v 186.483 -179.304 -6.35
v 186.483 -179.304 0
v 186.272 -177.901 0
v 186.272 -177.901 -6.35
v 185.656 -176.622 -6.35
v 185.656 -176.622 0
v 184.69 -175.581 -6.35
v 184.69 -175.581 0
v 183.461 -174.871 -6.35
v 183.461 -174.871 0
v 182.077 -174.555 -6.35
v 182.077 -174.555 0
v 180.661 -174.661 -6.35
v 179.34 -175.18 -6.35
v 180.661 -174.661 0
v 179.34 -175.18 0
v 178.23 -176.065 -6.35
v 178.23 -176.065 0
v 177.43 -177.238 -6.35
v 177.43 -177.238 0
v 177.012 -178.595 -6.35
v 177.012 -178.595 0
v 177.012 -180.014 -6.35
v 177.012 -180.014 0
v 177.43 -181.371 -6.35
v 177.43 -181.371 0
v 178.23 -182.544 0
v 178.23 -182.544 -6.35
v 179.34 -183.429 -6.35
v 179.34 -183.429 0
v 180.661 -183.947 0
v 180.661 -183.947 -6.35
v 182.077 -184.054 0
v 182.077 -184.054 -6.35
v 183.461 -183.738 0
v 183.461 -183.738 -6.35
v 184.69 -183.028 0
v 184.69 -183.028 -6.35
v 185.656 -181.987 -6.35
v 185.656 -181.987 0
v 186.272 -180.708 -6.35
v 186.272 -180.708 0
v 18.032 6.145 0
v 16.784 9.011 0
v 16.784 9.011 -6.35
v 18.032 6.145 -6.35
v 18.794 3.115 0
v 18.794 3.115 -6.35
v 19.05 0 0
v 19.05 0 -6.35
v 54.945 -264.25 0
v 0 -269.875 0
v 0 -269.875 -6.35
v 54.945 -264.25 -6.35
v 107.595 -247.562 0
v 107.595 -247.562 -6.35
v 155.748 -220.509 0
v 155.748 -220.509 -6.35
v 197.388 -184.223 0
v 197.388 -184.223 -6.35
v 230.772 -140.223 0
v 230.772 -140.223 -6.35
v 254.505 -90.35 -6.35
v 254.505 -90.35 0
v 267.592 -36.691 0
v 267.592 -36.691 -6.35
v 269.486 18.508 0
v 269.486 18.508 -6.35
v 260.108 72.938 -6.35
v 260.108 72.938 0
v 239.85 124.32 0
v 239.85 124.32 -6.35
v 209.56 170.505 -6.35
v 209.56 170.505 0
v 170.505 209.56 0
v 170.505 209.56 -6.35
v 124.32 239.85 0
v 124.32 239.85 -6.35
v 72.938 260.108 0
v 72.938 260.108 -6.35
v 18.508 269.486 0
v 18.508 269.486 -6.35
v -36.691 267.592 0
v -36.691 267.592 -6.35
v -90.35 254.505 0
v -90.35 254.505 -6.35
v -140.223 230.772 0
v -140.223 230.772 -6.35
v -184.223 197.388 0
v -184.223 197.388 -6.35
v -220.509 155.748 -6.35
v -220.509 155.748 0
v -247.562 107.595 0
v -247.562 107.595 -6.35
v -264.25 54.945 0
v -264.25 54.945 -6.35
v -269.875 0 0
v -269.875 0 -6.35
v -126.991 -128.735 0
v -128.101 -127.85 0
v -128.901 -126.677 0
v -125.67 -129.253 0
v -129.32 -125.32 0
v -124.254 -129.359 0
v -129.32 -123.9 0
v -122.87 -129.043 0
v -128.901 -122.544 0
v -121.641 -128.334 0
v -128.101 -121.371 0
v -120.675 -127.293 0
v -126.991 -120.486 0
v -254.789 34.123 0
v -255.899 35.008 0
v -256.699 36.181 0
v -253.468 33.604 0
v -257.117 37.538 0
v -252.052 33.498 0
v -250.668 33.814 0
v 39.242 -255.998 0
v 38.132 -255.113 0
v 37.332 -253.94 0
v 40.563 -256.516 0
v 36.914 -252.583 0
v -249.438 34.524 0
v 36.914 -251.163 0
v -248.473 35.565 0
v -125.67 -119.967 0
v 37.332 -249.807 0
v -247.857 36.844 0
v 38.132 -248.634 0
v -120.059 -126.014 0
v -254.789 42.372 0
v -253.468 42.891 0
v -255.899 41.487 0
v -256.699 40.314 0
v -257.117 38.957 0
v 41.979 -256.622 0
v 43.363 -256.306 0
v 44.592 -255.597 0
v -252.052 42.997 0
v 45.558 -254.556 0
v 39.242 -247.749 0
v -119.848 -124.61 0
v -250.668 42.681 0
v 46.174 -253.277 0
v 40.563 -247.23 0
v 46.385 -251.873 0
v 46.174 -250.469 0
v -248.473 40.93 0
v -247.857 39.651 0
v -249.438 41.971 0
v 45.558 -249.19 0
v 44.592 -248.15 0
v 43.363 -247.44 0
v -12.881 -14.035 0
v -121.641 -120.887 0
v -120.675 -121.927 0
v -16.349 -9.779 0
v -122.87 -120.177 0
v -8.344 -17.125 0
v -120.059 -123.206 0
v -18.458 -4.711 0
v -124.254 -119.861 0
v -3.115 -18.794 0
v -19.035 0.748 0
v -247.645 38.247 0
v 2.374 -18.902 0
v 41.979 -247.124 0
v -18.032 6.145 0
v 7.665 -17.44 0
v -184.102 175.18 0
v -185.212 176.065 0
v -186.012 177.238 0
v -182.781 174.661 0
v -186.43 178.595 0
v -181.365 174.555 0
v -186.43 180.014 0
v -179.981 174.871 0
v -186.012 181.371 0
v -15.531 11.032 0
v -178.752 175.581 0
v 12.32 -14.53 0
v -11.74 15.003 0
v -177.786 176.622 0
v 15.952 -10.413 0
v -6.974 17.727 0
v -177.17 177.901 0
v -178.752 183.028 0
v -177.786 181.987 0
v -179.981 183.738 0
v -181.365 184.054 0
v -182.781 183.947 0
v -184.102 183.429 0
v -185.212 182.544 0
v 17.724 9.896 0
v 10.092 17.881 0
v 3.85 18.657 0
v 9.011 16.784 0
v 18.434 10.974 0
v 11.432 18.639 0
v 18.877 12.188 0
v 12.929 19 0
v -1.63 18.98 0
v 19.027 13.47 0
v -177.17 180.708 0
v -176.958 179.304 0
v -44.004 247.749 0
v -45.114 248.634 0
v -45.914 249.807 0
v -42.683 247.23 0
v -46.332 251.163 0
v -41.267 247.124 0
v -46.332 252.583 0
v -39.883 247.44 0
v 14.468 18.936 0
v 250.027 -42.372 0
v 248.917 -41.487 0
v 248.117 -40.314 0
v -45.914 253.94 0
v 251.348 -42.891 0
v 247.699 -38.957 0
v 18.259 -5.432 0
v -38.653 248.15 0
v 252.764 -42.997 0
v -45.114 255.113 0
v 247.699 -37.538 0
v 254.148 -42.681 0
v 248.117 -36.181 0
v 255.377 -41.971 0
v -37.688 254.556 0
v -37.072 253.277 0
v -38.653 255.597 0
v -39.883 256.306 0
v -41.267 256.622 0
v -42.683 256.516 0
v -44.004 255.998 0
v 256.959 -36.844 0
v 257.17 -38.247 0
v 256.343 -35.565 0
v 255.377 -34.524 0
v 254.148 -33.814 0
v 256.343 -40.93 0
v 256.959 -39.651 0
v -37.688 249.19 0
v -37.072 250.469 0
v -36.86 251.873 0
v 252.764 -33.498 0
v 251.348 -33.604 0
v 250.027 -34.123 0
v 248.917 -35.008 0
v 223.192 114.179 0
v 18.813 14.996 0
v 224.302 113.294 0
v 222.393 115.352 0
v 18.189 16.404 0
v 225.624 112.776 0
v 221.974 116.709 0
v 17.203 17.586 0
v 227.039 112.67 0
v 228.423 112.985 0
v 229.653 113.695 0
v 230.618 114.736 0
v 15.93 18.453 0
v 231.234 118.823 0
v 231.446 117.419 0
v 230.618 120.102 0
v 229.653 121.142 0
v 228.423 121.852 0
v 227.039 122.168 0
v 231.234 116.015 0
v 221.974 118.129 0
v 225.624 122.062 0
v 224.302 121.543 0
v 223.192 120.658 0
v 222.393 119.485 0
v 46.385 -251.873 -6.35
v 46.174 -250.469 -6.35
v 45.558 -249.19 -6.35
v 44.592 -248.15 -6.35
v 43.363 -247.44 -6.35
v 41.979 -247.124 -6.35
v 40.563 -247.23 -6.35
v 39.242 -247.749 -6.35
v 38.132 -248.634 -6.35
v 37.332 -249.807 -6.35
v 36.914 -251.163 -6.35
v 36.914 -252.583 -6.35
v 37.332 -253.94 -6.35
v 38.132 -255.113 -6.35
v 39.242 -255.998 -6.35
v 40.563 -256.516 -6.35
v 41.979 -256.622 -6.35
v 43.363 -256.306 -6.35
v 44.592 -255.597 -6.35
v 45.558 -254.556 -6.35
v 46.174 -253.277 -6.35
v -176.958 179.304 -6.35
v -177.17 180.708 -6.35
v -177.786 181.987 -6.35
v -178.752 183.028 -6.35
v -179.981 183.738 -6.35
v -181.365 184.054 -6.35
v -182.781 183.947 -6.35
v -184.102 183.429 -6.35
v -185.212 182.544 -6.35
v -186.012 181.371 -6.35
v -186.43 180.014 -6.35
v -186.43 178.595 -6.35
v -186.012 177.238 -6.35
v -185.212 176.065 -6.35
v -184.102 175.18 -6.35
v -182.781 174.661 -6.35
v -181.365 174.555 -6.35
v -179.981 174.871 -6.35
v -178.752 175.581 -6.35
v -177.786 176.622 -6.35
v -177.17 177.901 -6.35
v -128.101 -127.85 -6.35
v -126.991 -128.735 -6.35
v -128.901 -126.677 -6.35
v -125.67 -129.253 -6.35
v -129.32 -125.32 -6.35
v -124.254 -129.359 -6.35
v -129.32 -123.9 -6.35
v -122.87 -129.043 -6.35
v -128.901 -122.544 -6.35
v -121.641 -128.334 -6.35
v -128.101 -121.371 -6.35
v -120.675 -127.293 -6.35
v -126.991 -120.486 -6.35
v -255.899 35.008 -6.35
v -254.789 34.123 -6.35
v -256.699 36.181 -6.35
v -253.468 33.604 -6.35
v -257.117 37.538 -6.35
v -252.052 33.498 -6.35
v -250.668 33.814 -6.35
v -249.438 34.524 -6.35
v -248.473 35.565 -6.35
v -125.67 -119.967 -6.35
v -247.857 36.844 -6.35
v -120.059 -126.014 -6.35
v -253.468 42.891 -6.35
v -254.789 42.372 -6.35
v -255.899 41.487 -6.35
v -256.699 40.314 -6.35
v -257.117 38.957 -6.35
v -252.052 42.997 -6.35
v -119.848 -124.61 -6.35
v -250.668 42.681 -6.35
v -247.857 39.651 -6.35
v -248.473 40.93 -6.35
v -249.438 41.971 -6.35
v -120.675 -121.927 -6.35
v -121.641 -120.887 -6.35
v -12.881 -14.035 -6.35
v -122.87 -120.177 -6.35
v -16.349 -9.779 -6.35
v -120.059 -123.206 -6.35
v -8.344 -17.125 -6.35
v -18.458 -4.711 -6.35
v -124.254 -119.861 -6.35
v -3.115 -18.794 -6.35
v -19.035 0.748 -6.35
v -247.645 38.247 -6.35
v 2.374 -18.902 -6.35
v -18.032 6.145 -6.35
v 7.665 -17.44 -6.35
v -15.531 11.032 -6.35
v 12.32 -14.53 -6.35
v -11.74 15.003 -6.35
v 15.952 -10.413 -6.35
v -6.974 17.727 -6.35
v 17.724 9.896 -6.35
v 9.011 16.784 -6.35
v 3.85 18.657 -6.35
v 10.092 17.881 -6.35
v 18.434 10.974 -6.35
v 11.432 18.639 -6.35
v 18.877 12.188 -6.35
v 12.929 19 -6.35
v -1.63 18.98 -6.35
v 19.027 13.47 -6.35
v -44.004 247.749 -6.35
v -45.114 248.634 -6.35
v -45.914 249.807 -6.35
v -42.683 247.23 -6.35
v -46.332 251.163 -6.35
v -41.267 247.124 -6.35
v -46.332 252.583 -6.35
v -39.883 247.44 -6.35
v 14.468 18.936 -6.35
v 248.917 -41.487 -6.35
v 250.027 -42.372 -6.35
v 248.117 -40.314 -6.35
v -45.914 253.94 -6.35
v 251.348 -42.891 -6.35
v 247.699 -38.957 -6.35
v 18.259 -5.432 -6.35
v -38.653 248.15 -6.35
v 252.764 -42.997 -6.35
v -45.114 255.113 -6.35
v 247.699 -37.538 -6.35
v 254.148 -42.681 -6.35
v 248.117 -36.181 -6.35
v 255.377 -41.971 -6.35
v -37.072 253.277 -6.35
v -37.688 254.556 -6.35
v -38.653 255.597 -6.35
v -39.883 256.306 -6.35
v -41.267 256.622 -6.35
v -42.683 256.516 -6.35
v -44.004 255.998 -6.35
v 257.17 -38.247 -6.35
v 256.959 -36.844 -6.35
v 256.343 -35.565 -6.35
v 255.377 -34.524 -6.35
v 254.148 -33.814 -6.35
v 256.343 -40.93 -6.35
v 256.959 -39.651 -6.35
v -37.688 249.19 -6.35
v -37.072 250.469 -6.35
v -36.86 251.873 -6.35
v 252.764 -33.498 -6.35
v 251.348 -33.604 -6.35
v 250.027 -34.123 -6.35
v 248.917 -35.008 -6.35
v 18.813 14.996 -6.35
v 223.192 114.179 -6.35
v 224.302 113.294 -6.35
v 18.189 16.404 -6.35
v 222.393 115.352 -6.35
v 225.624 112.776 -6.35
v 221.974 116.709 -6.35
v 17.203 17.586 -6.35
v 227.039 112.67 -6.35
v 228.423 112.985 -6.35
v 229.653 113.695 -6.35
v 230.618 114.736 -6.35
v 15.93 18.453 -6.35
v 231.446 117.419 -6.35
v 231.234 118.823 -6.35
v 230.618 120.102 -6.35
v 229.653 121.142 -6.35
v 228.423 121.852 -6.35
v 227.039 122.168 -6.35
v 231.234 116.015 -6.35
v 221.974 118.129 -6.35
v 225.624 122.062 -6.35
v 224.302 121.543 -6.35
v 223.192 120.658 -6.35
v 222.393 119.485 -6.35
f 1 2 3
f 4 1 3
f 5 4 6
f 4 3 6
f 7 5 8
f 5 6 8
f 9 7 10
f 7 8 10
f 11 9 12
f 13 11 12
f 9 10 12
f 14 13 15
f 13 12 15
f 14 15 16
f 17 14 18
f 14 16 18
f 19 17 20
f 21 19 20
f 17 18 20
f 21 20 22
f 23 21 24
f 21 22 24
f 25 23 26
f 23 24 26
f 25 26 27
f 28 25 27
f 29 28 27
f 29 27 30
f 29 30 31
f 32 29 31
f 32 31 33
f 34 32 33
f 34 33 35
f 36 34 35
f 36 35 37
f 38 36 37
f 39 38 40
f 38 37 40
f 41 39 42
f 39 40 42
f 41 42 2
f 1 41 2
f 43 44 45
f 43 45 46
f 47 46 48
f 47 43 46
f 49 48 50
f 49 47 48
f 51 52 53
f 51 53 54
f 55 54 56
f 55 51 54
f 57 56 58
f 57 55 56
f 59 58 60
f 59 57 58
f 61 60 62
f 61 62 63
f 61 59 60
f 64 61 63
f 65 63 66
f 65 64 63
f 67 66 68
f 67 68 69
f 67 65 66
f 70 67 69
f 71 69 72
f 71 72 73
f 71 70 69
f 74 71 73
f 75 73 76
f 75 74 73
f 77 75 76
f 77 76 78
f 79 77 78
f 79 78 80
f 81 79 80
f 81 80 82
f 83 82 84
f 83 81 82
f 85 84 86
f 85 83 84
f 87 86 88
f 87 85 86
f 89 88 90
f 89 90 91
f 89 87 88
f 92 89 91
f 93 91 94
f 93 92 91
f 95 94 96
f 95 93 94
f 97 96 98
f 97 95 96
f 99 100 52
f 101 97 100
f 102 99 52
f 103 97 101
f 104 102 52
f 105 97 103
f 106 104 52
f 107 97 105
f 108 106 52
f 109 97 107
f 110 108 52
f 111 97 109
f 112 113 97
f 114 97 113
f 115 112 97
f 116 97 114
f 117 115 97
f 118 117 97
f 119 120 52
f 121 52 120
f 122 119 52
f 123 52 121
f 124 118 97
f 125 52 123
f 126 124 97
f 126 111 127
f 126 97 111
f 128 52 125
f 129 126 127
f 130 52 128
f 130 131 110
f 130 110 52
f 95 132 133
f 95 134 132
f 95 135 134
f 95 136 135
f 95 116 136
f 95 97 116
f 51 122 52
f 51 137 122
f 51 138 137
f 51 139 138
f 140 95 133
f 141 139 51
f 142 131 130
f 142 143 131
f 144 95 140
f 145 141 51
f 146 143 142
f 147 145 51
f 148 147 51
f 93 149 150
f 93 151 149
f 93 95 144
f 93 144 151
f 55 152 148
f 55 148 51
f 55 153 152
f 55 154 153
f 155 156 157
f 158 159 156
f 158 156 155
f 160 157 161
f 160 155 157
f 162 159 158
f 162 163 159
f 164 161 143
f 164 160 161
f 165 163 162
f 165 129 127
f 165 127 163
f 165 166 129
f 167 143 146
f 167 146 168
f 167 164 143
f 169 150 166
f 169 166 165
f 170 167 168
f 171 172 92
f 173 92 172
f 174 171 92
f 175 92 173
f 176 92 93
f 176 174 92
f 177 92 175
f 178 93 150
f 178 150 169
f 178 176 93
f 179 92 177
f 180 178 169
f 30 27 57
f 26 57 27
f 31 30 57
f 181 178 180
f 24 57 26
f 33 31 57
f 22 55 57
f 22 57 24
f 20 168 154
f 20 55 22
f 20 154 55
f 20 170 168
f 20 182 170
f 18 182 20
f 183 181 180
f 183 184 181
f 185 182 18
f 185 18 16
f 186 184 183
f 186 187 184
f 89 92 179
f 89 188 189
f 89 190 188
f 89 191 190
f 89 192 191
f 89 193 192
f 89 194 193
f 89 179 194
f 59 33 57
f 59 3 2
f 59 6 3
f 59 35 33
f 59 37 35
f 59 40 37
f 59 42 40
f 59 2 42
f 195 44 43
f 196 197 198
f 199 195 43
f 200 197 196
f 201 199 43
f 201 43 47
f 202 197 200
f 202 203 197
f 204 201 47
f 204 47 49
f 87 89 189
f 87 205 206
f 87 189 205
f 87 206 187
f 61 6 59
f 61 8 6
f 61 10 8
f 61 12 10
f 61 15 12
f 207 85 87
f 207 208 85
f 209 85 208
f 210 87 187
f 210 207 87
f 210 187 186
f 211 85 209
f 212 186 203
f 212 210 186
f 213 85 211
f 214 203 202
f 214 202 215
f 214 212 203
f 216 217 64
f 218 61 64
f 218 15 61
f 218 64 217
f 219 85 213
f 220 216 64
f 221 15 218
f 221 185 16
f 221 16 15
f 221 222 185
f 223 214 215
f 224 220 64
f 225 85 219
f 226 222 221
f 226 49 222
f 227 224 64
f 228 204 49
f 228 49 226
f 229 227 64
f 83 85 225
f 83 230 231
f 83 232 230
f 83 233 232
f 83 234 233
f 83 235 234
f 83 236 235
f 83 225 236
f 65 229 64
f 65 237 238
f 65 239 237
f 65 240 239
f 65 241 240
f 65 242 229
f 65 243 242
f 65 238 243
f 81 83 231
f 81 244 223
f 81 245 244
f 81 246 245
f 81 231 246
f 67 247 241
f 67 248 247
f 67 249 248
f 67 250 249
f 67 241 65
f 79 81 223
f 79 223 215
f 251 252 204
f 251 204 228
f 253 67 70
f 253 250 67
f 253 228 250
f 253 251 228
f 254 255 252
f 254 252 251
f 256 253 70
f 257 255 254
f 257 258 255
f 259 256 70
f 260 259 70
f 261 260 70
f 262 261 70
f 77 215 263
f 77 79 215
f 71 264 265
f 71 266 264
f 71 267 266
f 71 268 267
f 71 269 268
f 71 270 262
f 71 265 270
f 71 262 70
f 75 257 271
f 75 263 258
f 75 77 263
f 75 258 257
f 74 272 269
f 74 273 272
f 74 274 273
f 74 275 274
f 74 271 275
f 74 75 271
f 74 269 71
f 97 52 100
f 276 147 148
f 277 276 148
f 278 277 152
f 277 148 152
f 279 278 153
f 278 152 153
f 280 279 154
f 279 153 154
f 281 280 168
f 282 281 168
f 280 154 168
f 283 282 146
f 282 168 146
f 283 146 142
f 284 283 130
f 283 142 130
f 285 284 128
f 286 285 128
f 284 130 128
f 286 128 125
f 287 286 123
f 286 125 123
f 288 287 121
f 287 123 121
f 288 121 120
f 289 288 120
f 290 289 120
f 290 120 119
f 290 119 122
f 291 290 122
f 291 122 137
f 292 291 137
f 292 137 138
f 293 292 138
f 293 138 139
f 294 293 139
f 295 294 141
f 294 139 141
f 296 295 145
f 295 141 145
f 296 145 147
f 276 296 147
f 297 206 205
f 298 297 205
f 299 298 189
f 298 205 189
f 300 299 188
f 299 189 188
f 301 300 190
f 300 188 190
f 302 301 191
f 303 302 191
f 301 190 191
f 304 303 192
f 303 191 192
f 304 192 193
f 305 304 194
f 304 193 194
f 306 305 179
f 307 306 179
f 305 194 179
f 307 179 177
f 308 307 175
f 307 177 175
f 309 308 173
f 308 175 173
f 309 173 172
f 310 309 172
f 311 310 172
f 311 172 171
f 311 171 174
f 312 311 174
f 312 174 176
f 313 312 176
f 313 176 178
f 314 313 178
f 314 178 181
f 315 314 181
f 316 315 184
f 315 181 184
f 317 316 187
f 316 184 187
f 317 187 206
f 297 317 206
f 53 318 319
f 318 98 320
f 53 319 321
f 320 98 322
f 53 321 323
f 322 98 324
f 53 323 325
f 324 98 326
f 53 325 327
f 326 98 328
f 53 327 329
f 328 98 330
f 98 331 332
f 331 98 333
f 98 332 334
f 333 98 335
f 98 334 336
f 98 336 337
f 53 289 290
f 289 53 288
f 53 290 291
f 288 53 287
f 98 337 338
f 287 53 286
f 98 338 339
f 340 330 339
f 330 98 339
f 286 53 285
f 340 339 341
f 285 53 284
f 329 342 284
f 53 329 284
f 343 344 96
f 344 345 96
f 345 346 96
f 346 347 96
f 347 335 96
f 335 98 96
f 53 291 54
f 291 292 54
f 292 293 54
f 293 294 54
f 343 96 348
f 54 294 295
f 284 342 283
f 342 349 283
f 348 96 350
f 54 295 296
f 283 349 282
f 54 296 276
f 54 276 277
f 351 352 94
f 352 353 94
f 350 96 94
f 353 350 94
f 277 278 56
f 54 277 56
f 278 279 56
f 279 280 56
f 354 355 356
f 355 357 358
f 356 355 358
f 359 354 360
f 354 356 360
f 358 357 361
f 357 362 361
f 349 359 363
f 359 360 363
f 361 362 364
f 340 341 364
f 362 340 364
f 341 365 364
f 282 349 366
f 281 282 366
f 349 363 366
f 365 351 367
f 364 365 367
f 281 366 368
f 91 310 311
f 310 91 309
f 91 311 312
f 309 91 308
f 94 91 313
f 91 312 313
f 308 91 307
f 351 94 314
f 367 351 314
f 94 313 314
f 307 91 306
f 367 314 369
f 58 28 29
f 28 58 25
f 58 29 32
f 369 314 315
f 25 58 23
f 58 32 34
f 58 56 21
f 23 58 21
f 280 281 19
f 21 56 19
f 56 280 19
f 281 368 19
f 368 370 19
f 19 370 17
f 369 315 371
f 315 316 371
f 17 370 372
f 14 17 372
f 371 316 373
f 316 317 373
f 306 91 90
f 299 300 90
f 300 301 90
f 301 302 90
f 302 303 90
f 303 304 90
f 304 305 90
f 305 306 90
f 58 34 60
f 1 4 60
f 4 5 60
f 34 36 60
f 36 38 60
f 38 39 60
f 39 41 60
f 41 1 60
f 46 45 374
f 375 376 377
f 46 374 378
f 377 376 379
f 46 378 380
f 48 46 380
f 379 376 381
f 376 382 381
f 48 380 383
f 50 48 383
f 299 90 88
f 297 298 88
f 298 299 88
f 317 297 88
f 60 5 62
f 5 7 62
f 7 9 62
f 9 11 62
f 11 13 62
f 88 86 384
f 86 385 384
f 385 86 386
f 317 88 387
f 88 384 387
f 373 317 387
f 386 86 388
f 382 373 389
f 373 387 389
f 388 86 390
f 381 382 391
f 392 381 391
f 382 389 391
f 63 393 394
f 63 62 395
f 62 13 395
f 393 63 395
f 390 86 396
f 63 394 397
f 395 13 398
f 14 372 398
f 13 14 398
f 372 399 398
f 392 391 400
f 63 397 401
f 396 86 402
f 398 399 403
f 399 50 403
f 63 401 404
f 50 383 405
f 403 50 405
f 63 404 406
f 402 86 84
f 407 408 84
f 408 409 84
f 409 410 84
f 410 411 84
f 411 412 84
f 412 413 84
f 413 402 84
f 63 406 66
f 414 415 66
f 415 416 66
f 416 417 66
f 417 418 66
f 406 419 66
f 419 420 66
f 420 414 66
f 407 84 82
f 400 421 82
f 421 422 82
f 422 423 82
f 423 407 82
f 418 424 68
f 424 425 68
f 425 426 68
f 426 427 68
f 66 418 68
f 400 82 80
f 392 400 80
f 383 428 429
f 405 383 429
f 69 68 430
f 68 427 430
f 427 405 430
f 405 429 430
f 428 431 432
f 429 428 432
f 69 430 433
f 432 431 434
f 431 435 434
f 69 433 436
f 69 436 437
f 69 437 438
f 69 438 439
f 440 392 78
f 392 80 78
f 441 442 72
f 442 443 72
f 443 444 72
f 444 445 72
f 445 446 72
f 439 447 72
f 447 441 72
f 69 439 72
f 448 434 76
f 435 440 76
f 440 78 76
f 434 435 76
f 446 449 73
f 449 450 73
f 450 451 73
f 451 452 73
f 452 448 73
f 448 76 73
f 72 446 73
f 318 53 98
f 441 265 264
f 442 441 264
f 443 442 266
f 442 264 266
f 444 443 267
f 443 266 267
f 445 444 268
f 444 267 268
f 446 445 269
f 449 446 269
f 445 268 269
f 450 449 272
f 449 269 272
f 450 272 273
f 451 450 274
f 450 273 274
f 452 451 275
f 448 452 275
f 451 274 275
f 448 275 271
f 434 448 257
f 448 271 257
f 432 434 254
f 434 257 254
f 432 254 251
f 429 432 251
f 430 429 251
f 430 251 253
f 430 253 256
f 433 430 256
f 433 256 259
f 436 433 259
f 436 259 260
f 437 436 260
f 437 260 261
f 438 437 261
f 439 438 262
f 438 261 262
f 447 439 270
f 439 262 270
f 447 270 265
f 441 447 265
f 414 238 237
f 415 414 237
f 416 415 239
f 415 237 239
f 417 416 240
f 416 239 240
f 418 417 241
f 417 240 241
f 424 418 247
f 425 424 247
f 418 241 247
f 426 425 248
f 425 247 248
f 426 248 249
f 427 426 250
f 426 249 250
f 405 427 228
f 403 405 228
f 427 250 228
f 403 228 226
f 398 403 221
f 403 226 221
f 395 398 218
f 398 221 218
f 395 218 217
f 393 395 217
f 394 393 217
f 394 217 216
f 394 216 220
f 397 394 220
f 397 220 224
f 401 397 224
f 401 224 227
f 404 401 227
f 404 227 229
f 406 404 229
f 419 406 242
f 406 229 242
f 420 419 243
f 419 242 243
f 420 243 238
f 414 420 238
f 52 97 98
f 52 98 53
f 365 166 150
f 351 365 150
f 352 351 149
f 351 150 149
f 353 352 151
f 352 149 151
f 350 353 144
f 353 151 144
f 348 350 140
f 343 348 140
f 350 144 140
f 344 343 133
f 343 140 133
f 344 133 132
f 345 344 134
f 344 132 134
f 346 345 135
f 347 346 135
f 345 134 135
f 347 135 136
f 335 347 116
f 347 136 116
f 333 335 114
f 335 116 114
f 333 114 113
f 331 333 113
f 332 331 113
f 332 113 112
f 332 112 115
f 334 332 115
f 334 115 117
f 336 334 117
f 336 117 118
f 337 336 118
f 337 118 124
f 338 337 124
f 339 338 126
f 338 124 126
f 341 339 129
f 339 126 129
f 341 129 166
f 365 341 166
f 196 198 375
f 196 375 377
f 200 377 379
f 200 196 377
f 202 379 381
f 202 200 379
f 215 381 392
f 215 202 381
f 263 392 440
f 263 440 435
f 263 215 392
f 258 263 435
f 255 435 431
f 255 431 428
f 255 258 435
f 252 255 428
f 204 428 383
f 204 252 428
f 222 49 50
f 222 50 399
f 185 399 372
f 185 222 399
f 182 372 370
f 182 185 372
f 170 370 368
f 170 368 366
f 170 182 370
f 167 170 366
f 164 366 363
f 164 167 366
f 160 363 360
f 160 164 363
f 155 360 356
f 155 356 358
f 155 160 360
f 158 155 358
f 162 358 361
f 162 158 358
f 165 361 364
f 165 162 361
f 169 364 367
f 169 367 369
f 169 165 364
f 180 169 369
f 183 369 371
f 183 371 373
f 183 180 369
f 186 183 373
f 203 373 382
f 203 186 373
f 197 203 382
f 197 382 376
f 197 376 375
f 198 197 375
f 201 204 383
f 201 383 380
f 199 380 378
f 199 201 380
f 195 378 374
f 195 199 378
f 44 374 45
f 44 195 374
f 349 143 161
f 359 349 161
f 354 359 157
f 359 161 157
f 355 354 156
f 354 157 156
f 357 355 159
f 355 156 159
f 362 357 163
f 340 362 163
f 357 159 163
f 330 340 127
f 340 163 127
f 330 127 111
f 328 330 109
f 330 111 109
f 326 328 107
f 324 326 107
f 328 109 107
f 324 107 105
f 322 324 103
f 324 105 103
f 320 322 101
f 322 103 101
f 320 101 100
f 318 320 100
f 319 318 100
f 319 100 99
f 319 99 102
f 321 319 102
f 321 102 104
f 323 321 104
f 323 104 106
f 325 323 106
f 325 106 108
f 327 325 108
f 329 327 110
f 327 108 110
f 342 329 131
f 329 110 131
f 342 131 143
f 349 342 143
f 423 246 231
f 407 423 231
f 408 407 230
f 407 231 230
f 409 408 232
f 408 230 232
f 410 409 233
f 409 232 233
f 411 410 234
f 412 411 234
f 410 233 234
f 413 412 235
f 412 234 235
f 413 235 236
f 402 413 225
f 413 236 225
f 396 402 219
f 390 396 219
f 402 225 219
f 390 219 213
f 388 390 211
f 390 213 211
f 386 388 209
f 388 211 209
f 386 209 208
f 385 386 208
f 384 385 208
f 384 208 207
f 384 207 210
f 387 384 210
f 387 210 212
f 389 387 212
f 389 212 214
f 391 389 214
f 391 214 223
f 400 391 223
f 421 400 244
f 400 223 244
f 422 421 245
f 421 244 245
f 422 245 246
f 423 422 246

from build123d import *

# Parameters (mm, degrees)
F0_R     = 4.7625
F1_DEPTH = 6.35


with BuildPart() as f1:
    # F0 (on Top) → F1 (new body)
    with BuildSketch(Plane.XY):
        with BuildLine():
            Line((-269.875, 0), (0, -269.875))
            ThreePointArc((0, -269.875), (191.033844, 191.033844), (-269.875, 0))
        make_face()
        with Locations((-124.610205, -124.610205)):
            Circle(F0_R, mode=Mode.SUBTRACT)
        with BuildLine():
            ThreePointArc((16.784284, 9.010566), (18.47489, 4.645529), (19.05, 0))
            ThreePointArc((19.05, 0), (-16.348605, -9.778835), (9.010566, 16.784284))
            ThreePointArc((9.010566, 16.784284), (15.21567, 18.745409), (19.026634, 13.470384))
            ThreePointArc((19.026634, 13.470384), (18.434494, 10.974482), (16.784284, 9.010566))
        make_face(mode=Mode.SUBTRACT)
        with Locations((41.622845, -251.873195)):
            Circle(F0_R, mode=Mode.SUBTRACT)
        with Locations((181.720938, -179.304401)):
            Circle(F0_R, mode=Mode.SUBTRACT)
        with Locations((252.40781, -38.24742)):
            Circle(F0_R, mode=Mode.SUBTRACT)
        with Locations((-252.40781, 38.24742)):
            Circle(F0_R, mode=Mode.SUBTRACT)
        with Locations((-181.720938, 179.304401)):
            Circle(F0_R, mode=Mode.SUBTRACT)
        with Locations((-41.622845, 251.873195)):
            Circle(F0_R, mode=Mode.SUBTRACT)
        with Locations((226.683477, 117.418776)):
            Circle(F0_R, mode=Mode.SUBTRACT)
    extrude(amount=-F1_DEPTH)


solid = f1.part
